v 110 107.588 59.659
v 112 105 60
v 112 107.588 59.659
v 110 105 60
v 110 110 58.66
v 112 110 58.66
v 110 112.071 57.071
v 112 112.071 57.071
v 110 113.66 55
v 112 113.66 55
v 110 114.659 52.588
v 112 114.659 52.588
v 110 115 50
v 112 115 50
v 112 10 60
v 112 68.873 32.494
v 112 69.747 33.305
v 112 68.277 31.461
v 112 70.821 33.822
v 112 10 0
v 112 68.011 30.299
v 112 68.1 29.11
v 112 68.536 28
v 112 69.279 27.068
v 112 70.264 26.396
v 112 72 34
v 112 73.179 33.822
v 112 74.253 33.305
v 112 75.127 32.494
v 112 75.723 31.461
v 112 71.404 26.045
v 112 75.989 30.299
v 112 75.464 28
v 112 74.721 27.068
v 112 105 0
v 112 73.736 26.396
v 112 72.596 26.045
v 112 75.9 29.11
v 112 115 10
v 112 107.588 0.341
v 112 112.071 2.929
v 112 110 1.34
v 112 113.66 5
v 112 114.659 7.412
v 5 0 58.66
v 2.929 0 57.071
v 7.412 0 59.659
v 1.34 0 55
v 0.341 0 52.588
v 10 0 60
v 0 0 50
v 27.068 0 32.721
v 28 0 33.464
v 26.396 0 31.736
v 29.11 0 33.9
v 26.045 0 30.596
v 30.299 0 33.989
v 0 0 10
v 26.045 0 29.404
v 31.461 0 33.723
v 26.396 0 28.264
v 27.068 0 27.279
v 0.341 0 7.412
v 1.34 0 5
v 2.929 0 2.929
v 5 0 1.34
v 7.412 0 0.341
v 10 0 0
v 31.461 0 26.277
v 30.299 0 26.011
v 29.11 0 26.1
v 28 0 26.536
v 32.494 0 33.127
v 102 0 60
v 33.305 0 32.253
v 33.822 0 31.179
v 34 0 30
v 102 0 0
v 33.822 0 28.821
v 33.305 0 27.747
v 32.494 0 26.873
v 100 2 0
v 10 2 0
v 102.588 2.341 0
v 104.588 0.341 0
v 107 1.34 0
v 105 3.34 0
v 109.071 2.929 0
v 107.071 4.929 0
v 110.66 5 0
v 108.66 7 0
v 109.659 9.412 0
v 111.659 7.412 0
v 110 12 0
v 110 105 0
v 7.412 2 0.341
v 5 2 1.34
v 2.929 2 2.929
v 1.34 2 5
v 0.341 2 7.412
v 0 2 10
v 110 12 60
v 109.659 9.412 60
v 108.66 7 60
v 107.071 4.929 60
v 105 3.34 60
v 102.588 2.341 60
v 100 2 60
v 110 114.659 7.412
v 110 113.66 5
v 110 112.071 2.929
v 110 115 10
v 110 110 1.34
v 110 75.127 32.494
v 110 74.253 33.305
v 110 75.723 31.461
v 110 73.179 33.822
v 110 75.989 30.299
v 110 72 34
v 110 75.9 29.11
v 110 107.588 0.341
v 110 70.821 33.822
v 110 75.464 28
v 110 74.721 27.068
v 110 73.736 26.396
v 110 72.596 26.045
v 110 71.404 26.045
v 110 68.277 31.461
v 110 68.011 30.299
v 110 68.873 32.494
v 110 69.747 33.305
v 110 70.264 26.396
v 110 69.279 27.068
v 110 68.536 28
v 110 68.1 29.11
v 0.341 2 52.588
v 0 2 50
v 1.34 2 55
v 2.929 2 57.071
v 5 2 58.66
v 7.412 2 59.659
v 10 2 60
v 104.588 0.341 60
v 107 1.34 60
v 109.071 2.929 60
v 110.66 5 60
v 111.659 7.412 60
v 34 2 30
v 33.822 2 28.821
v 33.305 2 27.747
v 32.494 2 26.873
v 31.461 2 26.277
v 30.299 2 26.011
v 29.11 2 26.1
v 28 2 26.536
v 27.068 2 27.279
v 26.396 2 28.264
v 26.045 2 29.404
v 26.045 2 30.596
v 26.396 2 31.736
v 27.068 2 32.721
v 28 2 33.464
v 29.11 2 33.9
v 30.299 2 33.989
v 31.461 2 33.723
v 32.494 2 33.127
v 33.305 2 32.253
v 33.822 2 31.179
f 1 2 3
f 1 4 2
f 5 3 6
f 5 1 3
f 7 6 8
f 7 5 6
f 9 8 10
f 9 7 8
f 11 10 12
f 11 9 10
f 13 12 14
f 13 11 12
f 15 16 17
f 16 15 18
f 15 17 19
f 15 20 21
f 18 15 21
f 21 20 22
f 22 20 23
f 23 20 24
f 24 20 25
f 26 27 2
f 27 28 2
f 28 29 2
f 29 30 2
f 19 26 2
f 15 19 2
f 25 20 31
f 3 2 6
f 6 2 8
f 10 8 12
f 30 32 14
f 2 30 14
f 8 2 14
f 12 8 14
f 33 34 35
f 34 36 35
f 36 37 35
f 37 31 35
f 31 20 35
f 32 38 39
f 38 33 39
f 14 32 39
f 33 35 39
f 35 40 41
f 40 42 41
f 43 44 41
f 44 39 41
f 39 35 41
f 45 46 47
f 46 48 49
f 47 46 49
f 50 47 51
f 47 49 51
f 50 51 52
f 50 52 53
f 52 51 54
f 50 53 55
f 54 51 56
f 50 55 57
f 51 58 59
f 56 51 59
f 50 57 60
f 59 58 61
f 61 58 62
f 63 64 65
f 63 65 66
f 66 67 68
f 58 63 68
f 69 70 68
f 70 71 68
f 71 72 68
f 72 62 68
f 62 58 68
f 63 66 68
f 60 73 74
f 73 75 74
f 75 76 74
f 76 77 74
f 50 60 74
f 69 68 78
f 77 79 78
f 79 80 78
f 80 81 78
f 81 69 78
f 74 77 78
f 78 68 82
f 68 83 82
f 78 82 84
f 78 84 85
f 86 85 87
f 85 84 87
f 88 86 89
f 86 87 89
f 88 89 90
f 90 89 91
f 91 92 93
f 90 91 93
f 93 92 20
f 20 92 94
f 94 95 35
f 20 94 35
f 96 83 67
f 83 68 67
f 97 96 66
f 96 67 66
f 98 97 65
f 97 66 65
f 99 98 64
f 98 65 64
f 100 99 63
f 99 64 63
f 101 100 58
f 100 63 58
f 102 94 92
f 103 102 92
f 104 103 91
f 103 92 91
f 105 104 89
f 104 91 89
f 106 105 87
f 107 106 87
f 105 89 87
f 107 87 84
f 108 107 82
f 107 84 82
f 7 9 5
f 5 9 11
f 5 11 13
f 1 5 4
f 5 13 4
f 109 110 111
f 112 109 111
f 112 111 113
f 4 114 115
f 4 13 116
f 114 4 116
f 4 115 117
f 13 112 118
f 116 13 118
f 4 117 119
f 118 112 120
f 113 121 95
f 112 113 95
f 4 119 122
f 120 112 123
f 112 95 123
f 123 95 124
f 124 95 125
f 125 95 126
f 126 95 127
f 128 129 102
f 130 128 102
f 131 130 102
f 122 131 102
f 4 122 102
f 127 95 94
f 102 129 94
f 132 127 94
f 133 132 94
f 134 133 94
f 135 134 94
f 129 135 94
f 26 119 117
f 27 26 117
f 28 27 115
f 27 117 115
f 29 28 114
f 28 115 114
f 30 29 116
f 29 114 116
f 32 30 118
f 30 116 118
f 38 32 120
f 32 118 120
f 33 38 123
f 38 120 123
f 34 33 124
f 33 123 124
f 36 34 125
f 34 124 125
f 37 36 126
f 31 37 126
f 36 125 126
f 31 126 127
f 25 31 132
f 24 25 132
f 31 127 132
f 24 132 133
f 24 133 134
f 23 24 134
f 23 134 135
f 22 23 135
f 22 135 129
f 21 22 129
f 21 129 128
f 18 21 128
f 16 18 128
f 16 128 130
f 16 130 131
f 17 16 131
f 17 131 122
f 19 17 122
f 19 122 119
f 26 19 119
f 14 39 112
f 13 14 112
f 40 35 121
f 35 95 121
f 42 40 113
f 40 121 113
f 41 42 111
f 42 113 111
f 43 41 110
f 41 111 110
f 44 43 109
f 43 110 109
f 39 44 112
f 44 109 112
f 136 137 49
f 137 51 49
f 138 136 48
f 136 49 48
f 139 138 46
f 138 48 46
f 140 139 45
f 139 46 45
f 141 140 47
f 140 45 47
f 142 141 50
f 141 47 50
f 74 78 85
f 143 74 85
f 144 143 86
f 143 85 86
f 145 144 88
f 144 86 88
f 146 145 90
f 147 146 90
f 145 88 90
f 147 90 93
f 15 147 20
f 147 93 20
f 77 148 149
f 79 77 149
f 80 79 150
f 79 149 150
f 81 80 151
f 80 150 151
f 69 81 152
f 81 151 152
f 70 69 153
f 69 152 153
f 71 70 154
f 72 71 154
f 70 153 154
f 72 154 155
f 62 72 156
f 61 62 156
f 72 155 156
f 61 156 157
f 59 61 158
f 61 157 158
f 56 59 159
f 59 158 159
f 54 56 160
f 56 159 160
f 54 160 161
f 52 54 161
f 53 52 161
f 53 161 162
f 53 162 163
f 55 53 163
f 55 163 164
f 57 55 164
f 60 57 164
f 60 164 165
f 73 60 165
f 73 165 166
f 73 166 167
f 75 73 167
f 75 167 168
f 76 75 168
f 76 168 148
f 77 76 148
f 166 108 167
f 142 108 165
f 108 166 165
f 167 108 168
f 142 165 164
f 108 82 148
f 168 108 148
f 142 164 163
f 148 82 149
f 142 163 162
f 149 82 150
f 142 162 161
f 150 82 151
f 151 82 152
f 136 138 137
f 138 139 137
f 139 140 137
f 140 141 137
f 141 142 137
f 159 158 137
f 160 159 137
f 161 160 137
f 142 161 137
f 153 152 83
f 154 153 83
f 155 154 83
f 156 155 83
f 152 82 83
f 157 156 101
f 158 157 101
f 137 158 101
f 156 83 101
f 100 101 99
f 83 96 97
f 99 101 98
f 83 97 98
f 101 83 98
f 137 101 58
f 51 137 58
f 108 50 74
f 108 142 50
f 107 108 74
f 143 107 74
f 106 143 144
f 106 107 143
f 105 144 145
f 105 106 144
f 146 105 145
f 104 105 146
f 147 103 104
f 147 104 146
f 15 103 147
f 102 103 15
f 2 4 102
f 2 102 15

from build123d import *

# Parameters (mm, degrees)
BOSS_EXTRUDE1_DEPTH = 60
SKETCH3_R           = 4
CUT_EXTRUDE1_DEPTH  = 3
SKETCH4_R           = 4
CUT_EXTRUDE2_DEPTH  = 3
FILLET3_R           = 10
FILLET4_R           = 10


with BuildPart() as part:
    # Sketch1 → Boss-Extrude1 (new body)
    with BuildSketch(Plane.XY):
        with BuildLine():
            Line((0, 0), (102, 0))
            ThreePointArc((102, 0), (109.071067812, 2.928932188), (112, 10))
            Line((112, 10), (112, 115))
            Line((112, 115), (110, 115))
            Line((110, 115), (110, 12))
            ThreePointArc((110, 12), (107.071067812, 4.928932188), (100, 2))
            Line((100, 2), (0, 2))
            Line((0, 2), (0, 0))
        make_face()
    extrude(amount=BOSS_EXTRUDE1_DEPTH)

    # Sketch3 → Cut-Extrude1 (cut, through all)
    with BuildSketch(Plane(origin=(0, 2, 0), x_dir=(1, 0, 0), z_dir=(0, 1, 0))):
        with Locations((30, -30)):
            Circle(SKETCH3_R)
    extrude(amount=-CUT_EXTRUDE1_DEPTH, mode=Mode.SUBTRACT)

    # Sketch4 → Cut-Extrude2 (cut, through all)
    with BuildSketch(Plane.ZY.offset(-110)):
        with Locations((30, 72)):
            Circle(SKETCH4_R)
    extrude(amount=-CUT_EXTRUDE2_DEPTH, mode=Mode.SUBTRACT)

    # Fillet3
    fillet3_edges = [part.edges().sort_by_distance(p)[0] for p in [
        (111, 115, 60),
        (111, 115, 0),
    ]]
    fillet(fillet3_edges, radius=FILLET3_R)

    # Fillet4
    fillet4_edges = [part.edges().sort_by_distance(p)[0] for p in [
        (0, 1, 0),
        (0, 1, 60),
    ]]
    fillet(fillet4_edges, radius=FILLET4_R)


solid = part.part
